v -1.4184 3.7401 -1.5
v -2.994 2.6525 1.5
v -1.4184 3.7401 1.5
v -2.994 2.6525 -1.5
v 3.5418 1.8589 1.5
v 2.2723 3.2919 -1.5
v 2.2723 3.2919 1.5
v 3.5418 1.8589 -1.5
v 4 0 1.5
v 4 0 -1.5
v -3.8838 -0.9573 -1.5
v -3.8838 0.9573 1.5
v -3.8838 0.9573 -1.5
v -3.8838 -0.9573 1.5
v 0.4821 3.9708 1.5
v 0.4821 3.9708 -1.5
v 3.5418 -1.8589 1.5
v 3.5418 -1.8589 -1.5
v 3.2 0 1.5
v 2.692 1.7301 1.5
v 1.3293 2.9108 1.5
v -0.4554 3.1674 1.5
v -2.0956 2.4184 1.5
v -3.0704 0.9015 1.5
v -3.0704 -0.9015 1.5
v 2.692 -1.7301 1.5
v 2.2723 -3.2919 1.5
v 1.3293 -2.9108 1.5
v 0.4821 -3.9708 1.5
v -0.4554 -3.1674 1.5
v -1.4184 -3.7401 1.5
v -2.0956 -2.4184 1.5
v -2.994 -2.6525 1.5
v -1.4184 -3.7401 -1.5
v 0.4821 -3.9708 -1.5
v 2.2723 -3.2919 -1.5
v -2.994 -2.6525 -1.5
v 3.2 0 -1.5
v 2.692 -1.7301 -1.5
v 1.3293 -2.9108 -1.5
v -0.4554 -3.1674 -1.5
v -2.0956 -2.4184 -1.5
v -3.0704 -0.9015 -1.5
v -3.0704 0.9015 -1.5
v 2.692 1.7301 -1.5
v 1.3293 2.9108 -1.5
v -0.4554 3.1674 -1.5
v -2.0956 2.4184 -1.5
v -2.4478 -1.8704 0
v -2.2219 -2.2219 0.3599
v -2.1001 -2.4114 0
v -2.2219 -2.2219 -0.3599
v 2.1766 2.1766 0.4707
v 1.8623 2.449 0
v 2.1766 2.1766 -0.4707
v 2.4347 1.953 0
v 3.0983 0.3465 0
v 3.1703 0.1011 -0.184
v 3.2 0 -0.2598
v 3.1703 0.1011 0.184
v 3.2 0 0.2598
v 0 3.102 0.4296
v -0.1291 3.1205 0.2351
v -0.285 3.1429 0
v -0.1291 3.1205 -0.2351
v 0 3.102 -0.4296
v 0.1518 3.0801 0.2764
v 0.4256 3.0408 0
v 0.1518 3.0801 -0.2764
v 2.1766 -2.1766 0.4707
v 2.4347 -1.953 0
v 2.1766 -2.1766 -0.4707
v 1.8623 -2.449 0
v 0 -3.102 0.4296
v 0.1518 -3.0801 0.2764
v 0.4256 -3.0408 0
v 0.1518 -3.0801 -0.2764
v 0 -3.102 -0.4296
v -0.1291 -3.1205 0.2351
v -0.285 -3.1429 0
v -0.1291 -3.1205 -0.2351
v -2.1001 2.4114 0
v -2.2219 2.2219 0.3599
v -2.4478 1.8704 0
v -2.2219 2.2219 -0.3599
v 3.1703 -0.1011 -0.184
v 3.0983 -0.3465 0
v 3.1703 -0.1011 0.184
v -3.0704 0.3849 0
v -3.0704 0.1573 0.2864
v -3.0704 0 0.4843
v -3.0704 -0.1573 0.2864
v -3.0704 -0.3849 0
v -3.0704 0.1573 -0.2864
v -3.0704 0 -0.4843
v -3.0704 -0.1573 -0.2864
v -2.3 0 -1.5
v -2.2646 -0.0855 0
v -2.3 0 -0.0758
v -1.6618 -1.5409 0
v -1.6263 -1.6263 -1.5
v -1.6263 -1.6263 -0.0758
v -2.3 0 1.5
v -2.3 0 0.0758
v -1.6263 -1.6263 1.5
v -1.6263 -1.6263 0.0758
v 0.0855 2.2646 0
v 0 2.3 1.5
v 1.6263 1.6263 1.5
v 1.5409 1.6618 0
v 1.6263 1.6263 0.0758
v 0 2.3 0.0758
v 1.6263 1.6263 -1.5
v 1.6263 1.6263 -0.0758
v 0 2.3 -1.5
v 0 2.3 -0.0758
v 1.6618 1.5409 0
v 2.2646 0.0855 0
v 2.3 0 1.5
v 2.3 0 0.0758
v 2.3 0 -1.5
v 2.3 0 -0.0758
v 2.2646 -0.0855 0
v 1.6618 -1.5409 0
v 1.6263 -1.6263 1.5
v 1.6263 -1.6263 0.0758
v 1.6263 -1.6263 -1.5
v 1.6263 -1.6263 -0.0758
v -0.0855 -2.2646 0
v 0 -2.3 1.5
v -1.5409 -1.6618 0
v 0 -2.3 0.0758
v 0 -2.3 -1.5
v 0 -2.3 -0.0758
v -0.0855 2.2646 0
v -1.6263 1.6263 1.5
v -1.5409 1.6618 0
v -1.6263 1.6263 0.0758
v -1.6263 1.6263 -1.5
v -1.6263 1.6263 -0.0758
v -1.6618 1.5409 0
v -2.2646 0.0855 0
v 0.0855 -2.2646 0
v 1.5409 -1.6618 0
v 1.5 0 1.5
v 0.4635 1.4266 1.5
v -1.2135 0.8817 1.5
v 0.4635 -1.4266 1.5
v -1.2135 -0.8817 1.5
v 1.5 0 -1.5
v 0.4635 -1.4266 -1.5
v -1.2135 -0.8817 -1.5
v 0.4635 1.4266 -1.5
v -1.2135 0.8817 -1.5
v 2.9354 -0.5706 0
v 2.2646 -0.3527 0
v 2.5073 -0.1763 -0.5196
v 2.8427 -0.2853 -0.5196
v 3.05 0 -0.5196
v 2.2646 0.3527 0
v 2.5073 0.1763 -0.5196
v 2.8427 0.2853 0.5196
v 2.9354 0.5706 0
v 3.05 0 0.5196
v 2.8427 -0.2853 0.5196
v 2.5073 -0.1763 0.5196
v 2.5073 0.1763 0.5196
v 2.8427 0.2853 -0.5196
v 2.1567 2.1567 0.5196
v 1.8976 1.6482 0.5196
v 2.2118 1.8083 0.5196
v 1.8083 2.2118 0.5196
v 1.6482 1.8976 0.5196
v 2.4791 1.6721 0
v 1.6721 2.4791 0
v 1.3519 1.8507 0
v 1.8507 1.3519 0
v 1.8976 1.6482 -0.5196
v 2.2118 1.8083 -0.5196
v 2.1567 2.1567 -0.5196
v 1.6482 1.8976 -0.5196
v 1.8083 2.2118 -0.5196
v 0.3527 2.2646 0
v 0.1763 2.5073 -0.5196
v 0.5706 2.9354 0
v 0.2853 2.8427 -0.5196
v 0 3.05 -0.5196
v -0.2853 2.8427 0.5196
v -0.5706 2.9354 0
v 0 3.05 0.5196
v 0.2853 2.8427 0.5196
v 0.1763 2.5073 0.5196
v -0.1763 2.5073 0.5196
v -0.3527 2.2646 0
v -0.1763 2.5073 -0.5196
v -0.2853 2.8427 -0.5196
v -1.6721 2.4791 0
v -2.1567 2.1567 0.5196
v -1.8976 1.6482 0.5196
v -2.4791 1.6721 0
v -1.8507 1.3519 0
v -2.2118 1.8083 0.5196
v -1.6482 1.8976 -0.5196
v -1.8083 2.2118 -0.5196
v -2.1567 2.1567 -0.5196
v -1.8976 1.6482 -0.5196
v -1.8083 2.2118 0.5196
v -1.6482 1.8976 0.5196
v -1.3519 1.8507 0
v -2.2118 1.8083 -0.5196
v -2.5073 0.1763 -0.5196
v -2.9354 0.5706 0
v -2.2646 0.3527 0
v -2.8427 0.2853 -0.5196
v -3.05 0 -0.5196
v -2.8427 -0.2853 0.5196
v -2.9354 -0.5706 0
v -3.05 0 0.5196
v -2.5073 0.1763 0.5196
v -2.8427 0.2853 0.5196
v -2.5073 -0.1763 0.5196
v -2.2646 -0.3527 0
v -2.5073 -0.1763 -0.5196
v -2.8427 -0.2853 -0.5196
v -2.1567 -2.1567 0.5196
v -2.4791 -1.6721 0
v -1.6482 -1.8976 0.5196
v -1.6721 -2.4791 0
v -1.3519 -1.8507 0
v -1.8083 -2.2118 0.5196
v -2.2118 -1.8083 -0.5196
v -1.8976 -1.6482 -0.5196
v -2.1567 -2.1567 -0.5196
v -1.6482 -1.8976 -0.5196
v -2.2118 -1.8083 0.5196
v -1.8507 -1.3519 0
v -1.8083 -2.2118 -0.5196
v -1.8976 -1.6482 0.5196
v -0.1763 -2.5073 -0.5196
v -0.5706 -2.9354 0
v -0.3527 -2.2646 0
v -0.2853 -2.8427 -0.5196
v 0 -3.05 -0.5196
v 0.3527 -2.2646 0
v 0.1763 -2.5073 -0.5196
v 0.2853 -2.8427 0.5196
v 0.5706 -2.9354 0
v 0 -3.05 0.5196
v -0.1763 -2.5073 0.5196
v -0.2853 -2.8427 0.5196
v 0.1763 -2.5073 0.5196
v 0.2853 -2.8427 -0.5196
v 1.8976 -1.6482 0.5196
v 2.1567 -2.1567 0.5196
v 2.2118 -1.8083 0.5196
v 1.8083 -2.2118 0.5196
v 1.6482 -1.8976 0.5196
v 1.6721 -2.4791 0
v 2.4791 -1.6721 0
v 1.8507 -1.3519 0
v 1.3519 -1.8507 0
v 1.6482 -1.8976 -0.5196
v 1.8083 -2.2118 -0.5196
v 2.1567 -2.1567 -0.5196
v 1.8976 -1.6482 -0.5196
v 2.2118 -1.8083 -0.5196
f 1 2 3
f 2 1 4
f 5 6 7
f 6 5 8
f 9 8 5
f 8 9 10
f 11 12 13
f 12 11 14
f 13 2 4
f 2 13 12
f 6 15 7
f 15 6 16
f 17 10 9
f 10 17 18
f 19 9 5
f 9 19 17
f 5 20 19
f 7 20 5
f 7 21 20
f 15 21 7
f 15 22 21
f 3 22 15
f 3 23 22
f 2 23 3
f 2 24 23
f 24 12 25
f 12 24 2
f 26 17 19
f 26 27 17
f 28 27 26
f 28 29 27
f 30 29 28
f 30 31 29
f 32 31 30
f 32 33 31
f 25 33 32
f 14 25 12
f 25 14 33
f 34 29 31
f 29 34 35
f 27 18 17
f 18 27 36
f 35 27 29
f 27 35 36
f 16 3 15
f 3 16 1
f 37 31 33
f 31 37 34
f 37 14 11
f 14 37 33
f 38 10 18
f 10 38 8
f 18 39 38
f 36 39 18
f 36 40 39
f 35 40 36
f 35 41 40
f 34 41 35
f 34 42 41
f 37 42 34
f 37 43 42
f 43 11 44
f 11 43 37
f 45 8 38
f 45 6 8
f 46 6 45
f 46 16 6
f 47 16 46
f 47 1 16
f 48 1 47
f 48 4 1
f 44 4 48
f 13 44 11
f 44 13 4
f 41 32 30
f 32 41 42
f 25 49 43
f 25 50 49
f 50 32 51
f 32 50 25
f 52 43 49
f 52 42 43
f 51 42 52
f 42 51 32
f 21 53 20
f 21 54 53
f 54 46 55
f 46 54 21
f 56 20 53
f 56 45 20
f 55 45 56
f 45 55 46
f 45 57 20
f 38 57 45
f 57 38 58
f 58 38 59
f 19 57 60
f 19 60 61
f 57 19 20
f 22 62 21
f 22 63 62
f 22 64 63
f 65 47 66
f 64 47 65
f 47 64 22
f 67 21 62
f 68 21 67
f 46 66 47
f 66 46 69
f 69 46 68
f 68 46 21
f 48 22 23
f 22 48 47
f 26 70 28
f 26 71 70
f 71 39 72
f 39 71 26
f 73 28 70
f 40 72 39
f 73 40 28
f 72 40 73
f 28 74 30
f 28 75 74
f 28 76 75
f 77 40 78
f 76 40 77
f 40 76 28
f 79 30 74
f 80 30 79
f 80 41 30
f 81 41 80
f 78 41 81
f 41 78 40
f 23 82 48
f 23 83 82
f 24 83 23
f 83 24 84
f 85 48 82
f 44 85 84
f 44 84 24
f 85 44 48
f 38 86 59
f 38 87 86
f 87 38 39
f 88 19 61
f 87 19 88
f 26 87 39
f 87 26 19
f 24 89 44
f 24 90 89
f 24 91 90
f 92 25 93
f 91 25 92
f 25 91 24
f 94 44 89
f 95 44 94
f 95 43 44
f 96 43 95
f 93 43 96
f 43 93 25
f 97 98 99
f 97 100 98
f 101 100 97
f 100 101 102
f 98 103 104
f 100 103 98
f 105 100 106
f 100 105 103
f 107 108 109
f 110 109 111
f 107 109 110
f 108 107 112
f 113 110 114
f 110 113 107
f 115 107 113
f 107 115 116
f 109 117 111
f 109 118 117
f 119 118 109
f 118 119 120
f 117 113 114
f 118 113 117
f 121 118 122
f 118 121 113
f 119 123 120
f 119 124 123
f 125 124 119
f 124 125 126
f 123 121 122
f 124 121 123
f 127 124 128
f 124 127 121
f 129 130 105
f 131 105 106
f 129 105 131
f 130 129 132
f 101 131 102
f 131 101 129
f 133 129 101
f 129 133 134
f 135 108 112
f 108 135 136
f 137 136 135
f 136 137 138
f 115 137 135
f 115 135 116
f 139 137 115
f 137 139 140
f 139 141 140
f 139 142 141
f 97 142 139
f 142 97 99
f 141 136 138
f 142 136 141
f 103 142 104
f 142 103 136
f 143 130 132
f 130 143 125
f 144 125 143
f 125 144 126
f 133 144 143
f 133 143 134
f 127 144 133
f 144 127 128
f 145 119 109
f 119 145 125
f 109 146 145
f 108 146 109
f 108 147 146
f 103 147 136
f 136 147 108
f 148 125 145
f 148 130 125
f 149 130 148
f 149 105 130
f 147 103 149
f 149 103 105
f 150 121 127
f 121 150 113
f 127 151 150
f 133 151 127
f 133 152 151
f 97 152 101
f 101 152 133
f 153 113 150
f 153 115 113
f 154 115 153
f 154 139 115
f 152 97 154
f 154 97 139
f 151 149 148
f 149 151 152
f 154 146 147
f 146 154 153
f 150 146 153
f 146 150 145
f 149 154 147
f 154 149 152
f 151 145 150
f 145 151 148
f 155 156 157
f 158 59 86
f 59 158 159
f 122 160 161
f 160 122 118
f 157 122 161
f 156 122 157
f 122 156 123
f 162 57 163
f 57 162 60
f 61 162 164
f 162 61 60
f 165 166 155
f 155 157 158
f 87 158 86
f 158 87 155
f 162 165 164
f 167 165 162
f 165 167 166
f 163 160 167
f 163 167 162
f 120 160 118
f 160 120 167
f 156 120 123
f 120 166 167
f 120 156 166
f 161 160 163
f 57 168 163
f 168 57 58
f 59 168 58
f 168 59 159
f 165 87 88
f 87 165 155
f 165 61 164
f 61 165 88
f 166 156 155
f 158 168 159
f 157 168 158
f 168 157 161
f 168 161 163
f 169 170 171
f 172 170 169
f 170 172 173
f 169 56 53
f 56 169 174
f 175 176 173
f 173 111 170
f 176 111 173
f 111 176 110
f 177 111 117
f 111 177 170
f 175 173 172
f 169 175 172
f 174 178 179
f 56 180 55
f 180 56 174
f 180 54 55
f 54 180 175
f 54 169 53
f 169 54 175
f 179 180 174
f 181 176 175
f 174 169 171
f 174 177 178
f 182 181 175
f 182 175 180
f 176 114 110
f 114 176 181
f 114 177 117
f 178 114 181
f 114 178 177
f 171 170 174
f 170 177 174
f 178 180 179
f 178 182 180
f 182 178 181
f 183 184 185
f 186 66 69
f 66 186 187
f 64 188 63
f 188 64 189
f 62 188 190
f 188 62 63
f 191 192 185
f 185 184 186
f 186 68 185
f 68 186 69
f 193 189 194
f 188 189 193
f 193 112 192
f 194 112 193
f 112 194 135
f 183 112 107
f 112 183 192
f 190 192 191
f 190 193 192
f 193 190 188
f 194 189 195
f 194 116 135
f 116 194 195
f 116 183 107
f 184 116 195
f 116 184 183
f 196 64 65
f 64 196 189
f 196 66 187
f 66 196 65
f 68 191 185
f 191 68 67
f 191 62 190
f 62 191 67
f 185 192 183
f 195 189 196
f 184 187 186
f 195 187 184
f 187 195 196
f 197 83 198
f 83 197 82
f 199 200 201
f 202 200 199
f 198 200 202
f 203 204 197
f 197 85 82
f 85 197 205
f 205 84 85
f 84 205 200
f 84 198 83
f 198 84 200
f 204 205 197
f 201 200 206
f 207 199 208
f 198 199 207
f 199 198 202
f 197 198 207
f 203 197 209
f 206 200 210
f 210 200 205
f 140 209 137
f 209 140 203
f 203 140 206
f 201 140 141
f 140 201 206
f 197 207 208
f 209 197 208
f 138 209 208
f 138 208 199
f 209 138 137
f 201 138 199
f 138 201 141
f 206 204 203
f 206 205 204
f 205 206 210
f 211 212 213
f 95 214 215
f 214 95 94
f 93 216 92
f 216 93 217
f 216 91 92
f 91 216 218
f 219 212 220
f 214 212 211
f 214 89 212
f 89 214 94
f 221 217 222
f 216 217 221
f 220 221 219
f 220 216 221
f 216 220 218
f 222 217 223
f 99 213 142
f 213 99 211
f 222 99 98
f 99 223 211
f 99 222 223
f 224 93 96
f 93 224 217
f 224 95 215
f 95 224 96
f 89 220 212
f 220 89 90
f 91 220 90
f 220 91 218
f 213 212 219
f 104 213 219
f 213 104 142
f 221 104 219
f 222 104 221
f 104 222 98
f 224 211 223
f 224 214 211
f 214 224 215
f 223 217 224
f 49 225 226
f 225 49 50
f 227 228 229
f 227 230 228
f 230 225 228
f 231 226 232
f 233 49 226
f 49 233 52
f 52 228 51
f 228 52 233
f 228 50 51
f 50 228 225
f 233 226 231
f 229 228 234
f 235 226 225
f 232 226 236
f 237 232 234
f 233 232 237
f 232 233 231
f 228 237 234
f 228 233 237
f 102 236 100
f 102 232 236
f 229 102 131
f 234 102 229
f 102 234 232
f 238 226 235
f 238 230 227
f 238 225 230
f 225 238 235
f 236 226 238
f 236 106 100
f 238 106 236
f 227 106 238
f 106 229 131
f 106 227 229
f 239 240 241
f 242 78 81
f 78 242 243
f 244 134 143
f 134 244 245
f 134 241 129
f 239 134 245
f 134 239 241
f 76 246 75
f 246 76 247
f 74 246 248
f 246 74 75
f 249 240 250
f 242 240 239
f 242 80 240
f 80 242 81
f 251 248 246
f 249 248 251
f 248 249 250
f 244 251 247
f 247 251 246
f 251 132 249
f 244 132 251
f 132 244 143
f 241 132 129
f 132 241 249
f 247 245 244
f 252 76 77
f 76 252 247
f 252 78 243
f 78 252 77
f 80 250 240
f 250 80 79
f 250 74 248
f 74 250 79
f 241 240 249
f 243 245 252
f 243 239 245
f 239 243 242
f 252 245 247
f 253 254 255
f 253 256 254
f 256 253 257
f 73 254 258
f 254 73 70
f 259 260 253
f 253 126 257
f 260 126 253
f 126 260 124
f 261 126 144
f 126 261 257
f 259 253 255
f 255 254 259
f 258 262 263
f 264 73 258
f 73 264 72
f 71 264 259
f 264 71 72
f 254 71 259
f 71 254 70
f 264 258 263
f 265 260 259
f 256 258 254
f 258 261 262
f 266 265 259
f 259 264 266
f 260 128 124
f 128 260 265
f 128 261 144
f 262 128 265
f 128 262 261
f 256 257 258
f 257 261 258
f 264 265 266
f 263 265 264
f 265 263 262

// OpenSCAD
// Parameters
bore_diameter_mm = 3.0; //[1.5:6.0:0.1]
outer_diameter_mm = 8.0; //[4.0:16.0:0.1]
width_mm = 3.0; //[1.5:6.0:0.1]
shield_type = 0; //[0:2:1]
flange_diameter_mm = 0.0; //[0.0:16.0:0.1]
flange_width_mm = 0.0; //[0.0:3.0:0.1]
race_rim_mm = 0.8; //[0.4:1.6:0.05]
hub_thickness_mm = 0.8; //[0.4:1.6:0.05]
ball_diameter_mm = 1.2; //[0.6:2.4:0.05]
ball_count = 8; //[4:16:1]
shield_thickness_mm = 0.3; //[0.15:0.8:0.05]
overlap_mm = 0.6; //[0.2:1.5:0.1]

// Bearing Ball - complete geometry
module bearing_ball() {
  color("Silver") {
    sphere(r=ball_diameter_mm/2);
  }
}

// Ball Bearing - complete geometry
module ball_bearing() {
  color("DimGray") {
    // Outer Race
    difference() {
      cylinder(r=outer_diameter_mm/2, h=width_mm, center=true);
      cylinder(r=outer_diameter_mm/2 - race_rim_mm, h=width_mm + 2*overlap_mm, center=true);
    }
    
    // Inner Race
    difference() {
      cylinder(r=bore_diameter_mm/2 + hub_thickness_mm, h=width_mm, center=true);
      cylinder(r=bore_diameter_mm/2, h=width_mm + 2*overlap_mm, center=true);
    }
    
    // Flange (if applicable)
    if (flange_diameter_mm > 0 && flange_width_mm > 0) {
      difference() {
        translate([0, 0, width_mm/2 - flange_width_mm/2 + overlap_mm])
          cylinder(r=flange_diameter_mm/2, h=flange_width_mm, center=true);
        translate([0, 0, width_mm/2 - flange_width_mm/2 + overlap_mm])
          cylinder(r=outer_diameter_mm/2 - race_rim_mm, h=flange_width_mm + 2*overlap_mm, center=true);
      }
    }
    
    // Shields or Seals (if applicable)
    if (shield_type > 0) {
      difference() {
        translate([0, 0, width_mm/2 - shield_thickness_mm/2])
          cylinder(r=outer_diameter_mm/2 - race_rim_mm + overlap_mm, h=shield_thickness_mm, center=true);
        translate([0, 0, width_mm/2 - shield_thickness_mm/2])
          cylinder(r=bore_diameter_mm/2 + hub_thickness_mm - overlap_mm, h=shield_thickness_mm + 2*overlap_mm, center=true);
      }
      difference() {
        translate([0, 0, -width_mm/2 + shield_thickness_mm/2])
          cylinder(r=outer_diameter_mm/2 - race_rim_mm + overlap_mm, h=shield_thickness_mm, center=true);
        translate([0, 0, -width_mm/2 + shield_thickness_mm/2])
          cylinder(r=bore_diameter_mm/2 + hub_thickness_mm - overlap_mm, h=shield_thickness_mm + 2*overlap_mm, center=true);
      }
    }
  }
  
  // Bearing Balls
  for (i = [0:ball_count-1]) {
    rotate([0, 0, i*360/ball_count]) 
      translate([(bore_diameter_mm/2 + hub_thickness_mm + (outer_diameter_mm/2 - race_rim_mm))/2, 0, 0])
        bearing_ball();
  }
}

// Assembly
module assembly() {
  ball_bearing();
}

assembly();
